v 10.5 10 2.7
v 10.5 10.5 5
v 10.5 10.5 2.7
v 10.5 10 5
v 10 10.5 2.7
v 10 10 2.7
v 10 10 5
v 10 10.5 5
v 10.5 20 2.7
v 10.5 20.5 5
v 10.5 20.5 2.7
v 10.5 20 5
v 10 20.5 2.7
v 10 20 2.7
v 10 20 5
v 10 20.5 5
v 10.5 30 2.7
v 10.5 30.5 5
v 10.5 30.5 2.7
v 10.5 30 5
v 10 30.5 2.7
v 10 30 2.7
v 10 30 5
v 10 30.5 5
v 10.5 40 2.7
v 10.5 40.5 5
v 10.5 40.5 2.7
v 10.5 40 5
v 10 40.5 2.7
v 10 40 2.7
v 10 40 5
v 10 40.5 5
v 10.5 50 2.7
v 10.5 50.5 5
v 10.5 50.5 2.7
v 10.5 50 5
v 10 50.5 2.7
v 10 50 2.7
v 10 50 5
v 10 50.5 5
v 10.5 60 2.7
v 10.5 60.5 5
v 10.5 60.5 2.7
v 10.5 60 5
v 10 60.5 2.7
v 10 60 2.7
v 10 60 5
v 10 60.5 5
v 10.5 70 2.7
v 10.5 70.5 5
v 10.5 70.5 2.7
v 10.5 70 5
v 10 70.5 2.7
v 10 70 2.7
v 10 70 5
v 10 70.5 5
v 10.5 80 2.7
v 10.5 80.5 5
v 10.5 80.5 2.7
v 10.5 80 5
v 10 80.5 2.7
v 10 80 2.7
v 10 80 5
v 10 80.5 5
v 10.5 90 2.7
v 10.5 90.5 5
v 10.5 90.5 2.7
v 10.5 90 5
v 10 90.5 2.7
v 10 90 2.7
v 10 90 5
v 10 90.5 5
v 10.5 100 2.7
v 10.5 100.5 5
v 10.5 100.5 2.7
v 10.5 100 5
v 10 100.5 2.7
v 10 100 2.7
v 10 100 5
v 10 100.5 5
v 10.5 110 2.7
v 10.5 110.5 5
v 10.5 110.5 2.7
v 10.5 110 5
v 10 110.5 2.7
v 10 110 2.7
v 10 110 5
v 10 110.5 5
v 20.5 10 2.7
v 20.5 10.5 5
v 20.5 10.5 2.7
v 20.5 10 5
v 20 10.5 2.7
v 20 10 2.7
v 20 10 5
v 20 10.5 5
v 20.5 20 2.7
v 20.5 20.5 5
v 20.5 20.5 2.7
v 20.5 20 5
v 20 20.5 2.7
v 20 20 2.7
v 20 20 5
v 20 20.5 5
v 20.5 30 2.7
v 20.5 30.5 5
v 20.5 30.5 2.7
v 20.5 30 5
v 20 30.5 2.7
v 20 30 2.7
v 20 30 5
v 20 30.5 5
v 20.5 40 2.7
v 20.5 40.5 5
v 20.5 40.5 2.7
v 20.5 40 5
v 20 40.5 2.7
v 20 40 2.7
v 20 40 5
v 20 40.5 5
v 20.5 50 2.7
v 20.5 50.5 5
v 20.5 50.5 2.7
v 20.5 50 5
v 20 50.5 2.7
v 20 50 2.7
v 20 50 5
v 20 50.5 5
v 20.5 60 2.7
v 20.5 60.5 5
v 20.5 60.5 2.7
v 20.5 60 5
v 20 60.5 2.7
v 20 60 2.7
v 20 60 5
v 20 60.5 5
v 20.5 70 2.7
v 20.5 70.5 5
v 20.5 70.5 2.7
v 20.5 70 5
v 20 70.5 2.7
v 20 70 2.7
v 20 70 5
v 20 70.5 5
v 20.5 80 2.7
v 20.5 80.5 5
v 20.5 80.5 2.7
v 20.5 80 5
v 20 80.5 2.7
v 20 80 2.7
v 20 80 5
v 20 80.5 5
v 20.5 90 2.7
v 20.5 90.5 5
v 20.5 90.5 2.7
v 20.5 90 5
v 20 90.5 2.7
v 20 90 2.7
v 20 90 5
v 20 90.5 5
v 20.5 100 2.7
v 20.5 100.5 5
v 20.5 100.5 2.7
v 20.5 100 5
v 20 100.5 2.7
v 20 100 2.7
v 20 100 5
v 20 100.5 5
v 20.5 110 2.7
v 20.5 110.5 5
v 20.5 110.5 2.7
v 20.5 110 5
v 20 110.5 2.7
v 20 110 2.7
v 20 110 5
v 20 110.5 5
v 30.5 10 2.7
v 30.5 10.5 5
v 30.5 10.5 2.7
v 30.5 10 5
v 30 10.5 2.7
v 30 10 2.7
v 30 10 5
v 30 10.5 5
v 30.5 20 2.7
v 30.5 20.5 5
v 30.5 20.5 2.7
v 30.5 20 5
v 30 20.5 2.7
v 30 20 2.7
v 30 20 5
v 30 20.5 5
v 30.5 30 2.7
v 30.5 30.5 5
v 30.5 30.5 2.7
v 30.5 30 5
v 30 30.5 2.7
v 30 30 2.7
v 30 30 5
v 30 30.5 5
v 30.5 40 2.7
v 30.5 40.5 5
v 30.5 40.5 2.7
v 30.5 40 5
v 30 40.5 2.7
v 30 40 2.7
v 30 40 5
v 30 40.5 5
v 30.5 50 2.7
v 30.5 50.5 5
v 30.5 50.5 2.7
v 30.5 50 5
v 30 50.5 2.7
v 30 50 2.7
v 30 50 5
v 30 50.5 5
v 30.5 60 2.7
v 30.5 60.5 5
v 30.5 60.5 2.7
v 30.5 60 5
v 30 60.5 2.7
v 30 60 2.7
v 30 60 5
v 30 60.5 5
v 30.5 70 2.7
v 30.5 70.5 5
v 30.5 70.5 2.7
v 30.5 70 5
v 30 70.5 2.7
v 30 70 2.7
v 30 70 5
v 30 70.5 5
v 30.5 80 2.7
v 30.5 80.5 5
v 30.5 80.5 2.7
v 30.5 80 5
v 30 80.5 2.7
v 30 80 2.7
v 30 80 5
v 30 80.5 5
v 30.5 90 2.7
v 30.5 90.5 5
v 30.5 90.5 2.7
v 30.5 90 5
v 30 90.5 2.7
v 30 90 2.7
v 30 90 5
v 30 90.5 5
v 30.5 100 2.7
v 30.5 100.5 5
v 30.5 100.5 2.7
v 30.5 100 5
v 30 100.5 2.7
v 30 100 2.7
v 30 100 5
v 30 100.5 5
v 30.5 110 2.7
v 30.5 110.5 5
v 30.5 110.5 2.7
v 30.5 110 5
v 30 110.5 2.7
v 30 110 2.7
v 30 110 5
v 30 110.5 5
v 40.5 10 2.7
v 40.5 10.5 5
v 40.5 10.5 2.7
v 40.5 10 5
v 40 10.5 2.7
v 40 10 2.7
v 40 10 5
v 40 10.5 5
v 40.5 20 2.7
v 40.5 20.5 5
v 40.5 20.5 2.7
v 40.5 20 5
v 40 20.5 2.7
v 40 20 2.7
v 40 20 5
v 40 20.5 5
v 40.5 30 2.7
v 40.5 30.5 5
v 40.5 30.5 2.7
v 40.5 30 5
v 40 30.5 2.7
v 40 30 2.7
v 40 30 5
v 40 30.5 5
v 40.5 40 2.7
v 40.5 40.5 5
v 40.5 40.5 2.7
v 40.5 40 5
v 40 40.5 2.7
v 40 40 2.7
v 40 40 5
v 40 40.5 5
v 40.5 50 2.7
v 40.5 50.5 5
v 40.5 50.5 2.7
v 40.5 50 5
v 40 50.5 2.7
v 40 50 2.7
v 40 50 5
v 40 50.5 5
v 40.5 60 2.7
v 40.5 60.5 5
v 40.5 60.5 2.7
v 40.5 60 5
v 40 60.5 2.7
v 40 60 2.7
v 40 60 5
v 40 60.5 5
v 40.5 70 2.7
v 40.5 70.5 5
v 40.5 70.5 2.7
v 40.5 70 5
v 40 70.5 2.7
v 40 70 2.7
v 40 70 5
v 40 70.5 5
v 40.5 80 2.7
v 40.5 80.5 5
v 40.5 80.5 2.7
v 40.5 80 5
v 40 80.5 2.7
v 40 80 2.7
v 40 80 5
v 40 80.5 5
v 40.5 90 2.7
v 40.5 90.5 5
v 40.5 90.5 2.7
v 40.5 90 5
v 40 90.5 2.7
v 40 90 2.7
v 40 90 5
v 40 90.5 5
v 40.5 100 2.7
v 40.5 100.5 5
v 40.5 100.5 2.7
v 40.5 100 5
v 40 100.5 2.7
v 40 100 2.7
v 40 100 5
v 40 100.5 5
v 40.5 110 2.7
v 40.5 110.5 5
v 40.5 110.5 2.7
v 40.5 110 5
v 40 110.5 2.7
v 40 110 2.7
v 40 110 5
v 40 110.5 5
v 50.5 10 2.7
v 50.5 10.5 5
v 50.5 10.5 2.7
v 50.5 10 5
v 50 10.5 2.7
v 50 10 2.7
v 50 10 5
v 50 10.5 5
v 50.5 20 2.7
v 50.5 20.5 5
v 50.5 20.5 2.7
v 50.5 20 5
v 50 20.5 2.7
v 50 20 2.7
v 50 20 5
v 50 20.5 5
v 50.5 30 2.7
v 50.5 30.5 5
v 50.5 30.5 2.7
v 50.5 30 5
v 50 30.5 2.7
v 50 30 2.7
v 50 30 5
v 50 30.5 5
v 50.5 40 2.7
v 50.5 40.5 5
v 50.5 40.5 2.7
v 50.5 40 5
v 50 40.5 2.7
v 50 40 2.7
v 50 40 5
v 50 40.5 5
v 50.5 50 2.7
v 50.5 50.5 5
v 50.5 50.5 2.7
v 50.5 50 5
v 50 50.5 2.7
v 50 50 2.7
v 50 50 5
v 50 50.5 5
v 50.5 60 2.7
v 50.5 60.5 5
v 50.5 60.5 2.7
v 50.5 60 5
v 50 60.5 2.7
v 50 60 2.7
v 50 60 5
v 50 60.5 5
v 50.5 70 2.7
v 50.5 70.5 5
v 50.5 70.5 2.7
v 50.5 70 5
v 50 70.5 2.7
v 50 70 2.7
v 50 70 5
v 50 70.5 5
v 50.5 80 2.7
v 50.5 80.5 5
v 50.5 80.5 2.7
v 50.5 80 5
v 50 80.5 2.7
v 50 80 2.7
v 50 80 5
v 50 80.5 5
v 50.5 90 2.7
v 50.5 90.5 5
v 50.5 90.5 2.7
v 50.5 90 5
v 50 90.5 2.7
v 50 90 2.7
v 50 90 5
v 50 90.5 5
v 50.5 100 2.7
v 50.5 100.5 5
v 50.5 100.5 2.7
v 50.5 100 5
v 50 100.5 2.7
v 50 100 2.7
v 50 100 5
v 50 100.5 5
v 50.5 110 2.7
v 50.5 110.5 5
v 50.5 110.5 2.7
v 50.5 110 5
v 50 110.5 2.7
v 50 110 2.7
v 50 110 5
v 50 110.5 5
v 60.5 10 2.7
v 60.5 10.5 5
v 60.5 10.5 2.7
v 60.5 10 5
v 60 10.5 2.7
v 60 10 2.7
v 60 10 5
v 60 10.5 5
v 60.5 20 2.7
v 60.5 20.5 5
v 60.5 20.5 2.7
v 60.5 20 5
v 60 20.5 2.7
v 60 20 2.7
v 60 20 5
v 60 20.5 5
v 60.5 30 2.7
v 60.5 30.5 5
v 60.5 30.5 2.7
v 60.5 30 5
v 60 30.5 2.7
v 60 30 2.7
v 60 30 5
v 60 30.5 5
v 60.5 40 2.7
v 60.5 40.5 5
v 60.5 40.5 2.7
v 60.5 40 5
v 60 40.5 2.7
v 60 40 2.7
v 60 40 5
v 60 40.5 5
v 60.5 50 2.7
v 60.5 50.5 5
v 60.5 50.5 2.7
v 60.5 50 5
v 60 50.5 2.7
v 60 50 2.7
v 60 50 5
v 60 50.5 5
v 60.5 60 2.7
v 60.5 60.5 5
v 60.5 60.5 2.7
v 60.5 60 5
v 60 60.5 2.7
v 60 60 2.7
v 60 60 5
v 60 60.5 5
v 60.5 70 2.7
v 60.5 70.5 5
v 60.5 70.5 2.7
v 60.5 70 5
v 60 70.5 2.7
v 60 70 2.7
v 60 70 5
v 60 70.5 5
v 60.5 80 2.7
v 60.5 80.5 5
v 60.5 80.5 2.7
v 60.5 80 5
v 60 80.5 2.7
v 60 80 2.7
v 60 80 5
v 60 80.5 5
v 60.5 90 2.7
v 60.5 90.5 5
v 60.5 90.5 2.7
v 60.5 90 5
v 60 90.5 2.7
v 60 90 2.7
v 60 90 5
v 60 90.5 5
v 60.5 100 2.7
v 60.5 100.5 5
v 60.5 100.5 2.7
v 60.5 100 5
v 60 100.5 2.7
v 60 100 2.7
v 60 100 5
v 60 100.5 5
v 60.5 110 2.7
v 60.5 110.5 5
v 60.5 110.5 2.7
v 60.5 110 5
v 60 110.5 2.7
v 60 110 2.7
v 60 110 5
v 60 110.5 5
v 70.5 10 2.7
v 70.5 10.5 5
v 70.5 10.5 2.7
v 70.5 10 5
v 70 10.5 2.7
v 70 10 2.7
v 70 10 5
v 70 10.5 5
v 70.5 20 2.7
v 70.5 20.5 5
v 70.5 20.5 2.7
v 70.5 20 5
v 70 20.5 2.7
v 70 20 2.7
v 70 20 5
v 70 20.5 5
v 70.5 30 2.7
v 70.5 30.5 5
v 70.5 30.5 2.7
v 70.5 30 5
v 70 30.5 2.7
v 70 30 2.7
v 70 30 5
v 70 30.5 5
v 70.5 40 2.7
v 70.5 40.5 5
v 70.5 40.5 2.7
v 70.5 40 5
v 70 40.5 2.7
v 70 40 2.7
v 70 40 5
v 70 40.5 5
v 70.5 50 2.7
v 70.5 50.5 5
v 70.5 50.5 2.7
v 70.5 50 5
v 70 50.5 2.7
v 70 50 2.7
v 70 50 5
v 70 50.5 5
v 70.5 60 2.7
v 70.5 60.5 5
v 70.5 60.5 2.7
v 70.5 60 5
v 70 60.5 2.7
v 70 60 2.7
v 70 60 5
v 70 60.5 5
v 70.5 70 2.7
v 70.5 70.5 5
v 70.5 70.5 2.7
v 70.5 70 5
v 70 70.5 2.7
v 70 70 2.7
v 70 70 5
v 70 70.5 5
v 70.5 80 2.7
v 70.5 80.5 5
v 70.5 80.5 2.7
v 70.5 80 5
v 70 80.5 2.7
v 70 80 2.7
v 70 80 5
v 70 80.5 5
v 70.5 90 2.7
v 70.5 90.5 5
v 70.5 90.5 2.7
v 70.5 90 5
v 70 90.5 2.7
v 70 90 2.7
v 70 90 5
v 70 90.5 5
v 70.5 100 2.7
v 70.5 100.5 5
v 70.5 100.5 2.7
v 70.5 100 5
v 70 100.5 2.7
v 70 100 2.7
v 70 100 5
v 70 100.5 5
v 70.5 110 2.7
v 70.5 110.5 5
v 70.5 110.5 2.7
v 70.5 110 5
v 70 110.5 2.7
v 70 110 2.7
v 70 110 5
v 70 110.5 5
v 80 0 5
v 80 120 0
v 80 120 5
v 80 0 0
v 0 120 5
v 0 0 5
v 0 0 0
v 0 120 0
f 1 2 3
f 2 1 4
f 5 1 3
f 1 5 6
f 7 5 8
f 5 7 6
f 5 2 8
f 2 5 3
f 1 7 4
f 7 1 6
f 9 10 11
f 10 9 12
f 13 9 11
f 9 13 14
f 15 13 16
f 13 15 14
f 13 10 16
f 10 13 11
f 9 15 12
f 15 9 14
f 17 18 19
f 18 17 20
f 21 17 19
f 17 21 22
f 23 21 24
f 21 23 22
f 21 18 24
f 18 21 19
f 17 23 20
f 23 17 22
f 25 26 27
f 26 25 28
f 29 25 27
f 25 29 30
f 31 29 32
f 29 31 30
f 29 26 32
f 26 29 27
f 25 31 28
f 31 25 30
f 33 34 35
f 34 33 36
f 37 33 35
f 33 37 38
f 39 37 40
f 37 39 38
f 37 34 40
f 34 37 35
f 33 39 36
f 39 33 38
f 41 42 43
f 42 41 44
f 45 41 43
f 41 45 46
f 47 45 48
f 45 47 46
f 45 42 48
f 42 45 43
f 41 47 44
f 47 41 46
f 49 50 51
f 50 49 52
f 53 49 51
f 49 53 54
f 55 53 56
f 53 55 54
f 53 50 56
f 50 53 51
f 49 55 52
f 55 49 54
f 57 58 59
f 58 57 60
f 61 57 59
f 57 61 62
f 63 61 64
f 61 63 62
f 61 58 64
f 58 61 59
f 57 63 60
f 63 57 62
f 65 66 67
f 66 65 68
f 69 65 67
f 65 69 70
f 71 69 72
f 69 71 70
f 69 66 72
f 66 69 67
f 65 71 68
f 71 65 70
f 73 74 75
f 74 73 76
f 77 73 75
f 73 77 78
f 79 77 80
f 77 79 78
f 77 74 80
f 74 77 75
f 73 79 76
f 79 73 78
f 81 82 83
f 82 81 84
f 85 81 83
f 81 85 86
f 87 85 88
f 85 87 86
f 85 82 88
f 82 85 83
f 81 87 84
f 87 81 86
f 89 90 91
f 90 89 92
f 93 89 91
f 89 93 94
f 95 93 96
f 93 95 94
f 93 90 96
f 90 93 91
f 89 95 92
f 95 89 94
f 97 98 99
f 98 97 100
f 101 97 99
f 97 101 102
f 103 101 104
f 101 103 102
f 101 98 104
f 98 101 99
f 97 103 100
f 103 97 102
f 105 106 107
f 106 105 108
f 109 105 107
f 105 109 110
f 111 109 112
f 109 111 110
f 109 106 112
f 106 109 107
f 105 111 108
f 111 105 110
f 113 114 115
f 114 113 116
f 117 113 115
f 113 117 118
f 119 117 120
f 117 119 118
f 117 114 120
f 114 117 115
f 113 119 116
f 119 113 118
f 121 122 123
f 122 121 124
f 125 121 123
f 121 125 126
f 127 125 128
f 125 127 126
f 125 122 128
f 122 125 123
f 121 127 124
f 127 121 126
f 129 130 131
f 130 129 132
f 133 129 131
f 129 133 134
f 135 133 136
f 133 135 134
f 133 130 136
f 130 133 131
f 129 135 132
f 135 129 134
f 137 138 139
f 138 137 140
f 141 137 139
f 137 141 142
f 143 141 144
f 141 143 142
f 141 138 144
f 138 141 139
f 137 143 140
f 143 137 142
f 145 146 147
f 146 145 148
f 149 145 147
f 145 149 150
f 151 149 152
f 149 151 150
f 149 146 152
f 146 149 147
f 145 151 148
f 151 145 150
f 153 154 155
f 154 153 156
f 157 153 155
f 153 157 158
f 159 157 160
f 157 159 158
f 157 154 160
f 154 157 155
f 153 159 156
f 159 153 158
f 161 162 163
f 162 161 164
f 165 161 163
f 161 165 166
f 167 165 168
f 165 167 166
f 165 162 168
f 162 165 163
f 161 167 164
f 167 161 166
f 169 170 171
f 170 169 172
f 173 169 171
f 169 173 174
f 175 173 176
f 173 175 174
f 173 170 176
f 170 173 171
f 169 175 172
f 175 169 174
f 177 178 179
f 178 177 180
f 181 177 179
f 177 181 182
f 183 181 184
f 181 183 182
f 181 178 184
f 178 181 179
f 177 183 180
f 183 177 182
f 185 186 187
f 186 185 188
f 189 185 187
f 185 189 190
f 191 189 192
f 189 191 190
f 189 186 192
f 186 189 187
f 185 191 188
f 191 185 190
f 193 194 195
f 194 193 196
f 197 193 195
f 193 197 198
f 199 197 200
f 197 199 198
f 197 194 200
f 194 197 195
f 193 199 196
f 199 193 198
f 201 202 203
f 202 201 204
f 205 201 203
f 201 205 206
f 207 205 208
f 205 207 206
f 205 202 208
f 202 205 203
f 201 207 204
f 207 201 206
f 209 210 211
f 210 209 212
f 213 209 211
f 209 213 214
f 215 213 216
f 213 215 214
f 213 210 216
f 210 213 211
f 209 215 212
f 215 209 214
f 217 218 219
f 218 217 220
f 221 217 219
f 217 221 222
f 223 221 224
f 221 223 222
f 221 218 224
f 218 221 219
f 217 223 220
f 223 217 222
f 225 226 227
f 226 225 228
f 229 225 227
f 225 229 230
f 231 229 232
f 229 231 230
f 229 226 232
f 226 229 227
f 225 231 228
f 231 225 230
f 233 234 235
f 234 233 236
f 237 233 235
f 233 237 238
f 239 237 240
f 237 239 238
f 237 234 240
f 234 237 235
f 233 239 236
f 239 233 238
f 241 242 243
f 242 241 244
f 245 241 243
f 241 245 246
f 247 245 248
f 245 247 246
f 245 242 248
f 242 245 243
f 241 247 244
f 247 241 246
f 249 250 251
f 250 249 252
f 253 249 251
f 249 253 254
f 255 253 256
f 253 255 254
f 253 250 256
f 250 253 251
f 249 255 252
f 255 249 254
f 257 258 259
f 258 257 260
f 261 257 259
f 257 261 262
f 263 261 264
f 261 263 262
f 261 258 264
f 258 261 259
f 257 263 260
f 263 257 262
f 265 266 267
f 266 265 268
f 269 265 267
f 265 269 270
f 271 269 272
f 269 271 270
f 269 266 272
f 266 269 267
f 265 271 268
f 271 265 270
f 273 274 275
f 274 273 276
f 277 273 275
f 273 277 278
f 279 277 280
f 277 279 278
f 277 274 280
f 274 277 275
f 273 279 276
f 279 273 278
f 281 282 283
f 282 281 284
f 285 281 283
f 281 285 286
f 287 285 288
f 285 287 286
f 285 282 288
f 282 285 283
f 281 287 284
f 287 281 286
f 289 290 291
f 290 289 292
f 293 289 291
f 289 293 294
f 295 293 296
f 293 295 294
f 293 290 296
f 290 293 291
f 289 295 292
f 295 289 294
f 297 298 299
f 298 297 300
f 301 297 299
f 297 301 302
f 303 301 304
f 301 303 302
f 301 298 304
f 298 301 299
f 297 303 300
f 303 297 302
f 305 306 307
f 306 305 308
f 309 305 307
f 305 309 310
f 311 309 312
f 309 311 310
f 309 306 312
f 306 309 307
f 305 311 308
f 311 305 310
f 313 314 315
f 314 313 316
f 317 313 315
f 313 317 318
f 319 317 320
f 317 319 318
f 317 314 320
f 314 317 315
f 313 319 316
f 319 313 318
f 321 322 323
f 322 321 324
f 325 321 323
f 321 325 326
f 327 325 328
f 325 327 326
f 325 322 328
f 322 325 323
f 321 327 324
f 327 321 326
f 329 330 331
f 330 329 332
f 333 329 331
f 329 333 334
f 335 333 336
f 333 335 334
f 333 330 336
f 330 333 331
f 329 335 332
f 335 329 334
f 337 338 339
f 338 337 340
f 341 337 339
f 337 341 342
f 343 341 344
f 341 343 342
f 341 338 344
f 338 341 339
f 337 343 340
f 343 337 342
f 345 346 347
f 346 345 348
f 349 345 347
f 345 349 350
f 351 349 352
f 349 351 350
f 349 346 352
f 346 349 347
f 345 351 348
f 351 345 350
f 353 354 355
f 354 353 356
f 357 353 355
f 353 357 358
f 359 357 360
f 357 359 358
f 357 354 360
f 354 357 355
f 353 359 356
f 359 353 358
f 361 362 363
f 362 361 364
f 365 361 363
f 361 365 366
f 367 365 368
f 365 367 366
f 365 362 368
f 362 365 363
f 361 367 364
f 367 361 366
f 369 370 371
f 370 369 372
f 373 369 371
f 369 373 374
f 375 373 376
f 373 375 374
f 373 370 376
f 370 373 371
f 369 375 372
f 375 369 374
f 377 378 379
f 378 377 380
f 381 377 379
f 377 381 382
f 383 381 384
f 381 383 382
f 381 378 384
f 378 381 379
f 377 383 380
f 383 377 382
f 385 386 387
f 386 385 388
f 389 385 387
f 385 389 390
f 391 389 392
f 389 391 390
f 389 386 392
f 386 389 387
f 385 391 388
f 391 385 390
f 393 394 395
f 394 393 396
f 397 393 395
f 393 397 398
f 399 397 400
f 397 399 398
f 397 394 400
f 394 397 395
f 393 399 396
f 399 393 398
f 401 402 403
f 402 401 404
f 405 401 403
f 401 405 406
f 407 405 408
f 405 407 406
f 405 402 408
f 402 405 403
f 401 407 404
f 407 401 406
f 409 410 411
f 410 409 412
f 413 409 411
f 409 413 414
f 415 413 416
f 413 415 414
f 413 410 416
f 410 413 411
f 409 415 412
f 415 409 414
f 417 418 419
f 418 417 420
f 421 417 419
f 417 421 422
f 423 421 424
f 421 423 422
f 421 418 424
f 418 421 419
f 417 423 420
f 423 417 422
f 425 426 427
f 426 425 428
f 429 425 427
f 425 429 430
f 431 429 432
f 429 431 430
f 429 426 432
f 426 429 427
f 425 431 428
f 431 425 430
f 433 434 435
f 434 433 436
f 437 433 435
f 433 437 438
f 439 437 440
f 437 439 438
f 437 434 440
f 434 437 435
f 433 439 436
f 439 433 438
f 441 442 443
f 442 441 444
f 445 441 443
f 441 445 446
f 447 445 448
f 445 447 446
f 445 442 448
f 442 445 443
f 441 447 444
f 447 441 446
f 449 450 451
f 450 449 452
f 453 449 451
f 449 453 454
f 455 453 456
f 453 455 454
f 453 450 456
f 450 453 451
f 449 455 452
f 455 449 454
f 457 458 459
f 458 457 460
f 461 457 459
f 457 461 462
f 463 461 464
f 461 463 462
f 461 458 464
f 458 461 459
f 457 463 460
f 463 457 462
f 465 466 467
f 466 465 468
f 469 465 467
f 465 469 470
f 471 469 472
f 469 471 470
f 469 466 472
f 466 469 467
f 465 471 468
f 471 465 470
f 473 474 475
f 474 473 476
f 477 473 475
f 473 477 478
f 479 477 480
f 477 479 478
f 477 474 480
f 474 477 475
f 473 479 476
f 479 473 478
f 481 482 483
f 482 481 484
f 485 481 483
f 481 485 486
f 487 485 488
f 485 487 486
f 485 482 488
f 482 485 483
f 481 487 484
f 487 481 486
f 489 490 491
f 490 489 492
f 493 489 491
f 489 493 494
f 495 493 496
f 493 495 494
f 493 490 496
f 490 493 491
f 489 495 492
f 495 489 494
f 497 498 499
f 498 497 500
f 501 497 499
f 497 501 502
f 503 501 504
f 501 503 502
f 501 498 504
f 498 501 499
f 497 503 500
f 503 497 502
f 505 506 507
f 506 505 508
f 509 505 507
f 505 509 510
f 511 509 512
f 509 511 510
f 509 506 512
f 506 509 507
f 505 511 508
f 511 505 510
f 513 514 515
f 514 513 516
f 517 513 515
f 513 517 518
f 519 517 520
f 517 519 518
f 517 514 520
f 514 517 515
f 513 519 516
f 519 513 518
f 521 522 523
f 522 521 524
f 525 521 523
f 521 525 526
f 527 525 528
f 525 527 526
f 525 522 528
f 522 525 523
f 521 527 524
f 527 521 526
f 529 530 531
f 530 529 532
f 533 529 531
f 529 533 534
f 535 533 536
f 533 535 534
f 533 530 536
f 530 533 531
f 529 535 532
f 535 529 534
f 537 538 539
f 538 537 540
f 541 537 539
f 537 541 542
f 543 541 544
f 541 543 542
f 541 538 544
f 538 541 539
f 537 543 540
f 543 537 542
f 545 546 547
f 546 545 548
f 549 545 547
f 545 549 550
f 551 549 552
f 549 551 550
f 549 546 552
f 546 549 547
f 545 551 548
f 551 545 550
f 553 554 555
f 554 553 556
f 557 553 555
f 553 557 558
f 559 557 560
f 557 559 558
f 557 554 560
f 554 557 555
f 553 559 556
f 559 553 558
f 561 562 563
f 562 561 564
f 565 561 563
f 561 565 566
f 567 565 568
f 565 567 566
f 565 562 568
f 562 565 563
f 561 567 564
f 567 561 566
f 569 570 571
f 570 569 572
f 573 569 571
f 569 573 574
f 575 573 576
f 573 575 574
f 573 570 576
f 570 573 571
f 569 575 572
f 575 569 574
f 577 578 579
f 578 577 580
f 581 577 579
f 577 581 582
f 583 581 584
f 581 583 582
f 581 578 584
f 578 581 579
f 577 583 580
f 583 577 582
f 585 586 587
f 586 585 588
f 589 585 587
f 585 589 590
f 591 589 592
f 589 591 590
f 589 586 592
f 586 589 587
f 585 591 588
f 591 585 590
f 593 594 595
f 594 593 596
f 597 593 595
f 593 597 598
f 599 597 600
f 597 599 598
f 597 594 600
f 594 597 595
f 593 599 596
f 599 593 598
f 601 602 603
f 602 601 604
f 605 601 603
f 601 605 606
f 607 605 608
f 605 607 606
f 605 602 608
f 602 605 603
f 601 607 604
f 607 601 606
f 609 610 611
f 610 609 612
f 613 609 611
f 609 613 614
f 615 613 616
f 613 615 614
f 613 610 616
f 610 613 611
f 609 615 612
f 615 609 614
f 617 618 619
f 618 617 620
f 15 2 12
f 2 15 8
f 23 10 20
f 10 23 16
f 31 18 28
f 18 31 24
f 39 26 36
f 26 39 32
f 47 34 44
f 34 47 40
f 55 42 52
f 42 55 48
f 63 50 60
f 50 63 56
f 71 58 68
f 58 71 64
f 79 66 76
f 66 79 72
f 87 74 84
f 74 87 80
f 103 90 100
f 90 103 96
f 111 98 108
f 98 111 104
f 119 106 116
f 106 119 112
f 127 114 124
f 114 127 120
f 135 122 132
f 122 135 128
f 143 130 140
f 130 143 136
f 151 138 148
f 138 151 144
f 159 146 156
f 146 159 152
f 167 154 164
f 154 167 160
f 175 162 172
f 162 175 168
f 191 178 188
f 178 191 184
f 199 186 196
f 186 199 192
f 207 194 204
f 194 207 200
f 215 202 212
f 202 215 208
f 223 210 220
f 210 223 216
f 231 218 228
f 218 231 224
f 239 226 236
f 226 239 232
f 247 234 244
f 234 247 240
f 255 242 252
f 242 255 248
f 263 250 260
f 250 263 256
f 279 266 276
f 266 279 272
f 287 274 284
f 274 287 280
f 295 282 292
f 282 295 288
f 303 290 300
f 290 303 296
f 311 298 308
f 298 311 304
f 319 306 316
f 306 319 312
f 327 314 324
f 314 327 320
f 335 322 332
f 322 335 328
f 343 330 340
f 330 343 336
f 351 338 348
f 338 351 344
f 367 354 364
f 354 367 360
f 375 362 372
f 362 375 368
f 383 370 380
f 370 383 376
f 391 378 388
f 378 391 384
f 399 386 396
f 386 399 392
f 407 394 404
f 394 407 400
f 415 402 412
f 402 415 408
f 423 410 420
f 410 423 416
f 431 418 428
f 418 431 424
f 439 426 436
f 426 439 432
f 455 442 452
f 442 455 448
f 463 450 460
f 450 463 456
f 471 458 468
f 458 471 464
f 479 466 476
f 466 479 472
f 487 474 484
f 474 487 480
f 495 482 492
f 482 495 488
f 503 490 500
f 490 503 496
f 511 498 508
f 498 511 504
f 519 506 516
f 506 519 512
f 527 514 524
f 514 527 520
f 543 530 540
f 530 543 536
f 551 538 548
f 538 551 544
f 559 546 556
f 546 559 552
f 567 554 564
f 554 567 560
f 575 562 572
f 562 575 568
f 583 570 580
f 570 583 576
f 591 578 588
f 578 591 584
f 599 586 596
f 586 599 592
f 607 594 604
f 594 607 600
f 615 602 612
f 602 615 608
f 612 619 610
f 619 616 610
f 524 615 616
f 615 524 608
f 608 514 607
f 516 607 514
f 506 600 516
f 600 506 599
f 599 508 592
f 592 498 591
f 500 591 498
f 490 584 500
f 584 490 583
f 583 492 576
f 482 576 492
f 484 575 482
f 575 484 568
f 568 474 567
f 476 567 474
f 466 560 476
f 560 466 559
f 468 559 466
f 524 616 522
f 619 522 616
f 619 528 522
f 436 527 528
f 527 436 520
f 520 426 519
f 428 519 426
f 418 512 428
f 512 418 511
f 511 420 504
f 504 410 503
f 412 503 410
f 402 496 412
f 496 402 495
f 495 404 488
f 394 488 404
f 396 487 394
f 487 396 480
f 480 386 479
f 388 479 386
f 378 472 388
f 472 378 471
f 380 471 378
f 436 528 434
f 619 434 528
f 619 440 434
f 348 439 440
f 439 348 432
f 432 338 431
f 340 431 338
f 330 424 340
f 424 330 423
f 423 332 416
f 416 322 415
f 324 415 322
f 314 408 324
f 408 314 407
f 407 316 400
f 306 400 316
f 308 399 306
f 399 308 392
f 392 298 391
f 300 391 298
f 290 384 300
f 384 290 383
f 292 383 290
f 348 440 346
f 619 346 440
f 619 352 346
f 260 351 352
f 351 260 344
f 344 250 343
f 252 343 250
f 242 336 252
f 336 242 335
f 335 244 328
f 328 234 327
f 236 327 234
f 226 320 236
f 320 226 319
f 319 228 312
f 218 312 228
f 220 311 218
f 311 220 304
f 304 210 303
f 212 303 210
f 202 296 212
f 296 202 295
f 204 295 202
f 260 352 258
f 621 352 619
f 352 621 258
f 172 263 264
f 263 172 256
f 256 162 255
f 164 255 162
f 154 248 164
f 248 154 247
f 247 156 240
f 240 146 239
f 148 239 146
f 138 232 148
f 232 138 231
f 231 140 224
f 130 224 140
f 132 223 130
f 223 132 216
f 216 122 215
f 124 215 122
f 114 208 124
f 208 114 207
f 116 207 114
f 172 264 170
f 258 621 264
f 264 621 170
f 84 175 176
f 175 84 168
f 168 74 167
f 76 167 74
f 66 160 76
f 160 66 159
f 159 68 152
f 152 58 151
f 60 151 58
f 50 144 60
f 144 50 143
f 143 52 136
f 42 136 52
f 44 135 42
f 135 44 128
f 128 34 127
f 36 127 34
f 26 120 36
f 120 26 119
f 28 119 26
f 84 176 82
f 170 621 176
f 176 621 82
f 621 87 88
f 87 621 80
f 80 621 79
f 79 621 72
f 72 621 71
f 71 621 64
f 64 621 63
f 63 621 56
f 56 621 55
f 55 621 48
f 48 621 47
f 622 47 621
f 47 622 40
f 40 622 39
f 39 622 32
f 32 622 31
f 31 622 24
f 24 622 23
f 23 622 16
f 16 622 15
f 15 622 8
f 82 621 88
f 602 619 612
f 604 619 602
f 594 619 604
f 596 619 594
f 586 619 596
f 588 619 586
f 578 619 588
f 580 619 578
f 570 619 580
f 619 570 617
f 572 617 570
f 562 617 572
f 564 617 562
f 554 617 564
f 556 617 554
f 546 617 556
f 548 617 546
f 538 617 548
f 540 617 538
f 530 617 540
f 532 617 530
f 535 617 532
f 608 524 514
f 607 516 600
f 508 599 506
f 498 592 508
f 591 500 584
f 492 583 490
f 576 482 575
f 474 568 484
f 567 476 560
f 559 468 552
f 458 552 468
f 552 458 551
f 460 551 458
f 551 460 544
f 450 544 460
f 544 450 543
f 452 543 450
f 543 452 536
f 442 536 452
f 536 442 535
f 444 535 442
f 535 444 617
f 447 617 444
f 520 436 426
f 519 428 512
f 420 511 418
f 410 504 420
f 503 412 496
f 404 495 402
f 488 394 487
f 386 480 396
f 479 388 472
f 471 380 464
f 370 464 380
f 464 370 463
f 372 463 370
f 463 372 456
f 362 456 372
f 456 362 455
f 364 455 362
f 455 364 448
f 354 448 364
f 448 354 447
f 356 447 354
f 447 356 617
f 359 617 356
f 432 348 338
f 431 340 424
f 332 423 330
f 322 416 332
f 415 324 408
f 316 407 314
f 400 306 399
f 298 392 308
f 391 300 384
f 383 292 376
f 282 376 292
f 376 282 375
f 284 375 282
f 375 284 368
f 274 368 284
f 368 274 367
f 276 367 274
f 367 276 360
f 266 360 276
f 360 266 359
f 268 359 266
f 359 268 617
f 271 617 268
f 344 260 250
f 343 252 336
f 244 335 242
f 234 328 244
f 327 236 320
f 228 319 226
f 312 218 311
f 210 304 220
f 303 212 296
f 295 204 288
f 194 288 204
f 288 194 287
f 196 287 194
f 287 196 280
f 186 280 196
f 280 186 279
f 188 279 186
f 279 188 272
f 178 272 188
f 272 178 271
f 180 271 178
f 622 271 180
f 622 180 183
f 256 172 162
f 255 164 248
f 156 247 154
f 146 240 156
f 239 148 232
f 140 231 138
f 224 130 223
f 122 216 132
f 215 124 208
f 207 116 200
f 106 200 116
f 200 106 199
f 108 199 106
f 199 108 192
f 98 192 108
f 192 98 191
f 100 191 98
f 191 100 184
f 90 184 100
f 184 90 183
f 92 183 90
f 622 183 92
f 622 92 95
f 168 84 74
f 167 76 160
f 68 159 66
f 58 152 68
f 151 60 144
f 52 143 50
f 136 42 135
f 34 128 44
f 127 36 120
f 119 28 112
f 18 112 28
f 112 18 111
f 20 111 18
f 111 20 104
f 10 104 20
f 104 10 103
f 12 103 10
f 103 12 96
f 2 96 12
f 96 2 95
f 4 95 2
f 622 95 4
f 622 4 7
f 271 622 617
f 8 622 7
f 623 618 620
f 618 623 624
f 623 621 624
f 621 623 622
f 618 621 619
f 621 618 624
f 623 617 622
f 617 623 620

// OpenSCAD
/**
Title: Needle Holder
Description: Holder for 24ga needles
Designer: Nam Tran
Units: mm
Last Modified: 2022-06-16
*/

well_depth = 2.3;
well_diameter = 0.5;
distance_between_wells = 10;

base_width = 80;
base_depth = 120;
base_height = 5;

module base() {
    cube([base_width, base_depth, base_height]);
}

module wells() {
    for (i = [0:distance_between_wells:(base_width - (2 * distance_between_wells))]) {
        for (j = [0:distance_between_wells:(base_depth - (2 * distance_between_wells))]) {
            translate([(distance_between_wells + i), (distance_between_wells + j), (base_height - well_depth)])
            //cylinder(h=(well_depth + 0.1), r=well_diameter, $fn=360);
            cube([well_diameter, well_diameter, (well_depth + 0.1)]);
        }
    }
}

difference() {
    base();
    wells();
}
